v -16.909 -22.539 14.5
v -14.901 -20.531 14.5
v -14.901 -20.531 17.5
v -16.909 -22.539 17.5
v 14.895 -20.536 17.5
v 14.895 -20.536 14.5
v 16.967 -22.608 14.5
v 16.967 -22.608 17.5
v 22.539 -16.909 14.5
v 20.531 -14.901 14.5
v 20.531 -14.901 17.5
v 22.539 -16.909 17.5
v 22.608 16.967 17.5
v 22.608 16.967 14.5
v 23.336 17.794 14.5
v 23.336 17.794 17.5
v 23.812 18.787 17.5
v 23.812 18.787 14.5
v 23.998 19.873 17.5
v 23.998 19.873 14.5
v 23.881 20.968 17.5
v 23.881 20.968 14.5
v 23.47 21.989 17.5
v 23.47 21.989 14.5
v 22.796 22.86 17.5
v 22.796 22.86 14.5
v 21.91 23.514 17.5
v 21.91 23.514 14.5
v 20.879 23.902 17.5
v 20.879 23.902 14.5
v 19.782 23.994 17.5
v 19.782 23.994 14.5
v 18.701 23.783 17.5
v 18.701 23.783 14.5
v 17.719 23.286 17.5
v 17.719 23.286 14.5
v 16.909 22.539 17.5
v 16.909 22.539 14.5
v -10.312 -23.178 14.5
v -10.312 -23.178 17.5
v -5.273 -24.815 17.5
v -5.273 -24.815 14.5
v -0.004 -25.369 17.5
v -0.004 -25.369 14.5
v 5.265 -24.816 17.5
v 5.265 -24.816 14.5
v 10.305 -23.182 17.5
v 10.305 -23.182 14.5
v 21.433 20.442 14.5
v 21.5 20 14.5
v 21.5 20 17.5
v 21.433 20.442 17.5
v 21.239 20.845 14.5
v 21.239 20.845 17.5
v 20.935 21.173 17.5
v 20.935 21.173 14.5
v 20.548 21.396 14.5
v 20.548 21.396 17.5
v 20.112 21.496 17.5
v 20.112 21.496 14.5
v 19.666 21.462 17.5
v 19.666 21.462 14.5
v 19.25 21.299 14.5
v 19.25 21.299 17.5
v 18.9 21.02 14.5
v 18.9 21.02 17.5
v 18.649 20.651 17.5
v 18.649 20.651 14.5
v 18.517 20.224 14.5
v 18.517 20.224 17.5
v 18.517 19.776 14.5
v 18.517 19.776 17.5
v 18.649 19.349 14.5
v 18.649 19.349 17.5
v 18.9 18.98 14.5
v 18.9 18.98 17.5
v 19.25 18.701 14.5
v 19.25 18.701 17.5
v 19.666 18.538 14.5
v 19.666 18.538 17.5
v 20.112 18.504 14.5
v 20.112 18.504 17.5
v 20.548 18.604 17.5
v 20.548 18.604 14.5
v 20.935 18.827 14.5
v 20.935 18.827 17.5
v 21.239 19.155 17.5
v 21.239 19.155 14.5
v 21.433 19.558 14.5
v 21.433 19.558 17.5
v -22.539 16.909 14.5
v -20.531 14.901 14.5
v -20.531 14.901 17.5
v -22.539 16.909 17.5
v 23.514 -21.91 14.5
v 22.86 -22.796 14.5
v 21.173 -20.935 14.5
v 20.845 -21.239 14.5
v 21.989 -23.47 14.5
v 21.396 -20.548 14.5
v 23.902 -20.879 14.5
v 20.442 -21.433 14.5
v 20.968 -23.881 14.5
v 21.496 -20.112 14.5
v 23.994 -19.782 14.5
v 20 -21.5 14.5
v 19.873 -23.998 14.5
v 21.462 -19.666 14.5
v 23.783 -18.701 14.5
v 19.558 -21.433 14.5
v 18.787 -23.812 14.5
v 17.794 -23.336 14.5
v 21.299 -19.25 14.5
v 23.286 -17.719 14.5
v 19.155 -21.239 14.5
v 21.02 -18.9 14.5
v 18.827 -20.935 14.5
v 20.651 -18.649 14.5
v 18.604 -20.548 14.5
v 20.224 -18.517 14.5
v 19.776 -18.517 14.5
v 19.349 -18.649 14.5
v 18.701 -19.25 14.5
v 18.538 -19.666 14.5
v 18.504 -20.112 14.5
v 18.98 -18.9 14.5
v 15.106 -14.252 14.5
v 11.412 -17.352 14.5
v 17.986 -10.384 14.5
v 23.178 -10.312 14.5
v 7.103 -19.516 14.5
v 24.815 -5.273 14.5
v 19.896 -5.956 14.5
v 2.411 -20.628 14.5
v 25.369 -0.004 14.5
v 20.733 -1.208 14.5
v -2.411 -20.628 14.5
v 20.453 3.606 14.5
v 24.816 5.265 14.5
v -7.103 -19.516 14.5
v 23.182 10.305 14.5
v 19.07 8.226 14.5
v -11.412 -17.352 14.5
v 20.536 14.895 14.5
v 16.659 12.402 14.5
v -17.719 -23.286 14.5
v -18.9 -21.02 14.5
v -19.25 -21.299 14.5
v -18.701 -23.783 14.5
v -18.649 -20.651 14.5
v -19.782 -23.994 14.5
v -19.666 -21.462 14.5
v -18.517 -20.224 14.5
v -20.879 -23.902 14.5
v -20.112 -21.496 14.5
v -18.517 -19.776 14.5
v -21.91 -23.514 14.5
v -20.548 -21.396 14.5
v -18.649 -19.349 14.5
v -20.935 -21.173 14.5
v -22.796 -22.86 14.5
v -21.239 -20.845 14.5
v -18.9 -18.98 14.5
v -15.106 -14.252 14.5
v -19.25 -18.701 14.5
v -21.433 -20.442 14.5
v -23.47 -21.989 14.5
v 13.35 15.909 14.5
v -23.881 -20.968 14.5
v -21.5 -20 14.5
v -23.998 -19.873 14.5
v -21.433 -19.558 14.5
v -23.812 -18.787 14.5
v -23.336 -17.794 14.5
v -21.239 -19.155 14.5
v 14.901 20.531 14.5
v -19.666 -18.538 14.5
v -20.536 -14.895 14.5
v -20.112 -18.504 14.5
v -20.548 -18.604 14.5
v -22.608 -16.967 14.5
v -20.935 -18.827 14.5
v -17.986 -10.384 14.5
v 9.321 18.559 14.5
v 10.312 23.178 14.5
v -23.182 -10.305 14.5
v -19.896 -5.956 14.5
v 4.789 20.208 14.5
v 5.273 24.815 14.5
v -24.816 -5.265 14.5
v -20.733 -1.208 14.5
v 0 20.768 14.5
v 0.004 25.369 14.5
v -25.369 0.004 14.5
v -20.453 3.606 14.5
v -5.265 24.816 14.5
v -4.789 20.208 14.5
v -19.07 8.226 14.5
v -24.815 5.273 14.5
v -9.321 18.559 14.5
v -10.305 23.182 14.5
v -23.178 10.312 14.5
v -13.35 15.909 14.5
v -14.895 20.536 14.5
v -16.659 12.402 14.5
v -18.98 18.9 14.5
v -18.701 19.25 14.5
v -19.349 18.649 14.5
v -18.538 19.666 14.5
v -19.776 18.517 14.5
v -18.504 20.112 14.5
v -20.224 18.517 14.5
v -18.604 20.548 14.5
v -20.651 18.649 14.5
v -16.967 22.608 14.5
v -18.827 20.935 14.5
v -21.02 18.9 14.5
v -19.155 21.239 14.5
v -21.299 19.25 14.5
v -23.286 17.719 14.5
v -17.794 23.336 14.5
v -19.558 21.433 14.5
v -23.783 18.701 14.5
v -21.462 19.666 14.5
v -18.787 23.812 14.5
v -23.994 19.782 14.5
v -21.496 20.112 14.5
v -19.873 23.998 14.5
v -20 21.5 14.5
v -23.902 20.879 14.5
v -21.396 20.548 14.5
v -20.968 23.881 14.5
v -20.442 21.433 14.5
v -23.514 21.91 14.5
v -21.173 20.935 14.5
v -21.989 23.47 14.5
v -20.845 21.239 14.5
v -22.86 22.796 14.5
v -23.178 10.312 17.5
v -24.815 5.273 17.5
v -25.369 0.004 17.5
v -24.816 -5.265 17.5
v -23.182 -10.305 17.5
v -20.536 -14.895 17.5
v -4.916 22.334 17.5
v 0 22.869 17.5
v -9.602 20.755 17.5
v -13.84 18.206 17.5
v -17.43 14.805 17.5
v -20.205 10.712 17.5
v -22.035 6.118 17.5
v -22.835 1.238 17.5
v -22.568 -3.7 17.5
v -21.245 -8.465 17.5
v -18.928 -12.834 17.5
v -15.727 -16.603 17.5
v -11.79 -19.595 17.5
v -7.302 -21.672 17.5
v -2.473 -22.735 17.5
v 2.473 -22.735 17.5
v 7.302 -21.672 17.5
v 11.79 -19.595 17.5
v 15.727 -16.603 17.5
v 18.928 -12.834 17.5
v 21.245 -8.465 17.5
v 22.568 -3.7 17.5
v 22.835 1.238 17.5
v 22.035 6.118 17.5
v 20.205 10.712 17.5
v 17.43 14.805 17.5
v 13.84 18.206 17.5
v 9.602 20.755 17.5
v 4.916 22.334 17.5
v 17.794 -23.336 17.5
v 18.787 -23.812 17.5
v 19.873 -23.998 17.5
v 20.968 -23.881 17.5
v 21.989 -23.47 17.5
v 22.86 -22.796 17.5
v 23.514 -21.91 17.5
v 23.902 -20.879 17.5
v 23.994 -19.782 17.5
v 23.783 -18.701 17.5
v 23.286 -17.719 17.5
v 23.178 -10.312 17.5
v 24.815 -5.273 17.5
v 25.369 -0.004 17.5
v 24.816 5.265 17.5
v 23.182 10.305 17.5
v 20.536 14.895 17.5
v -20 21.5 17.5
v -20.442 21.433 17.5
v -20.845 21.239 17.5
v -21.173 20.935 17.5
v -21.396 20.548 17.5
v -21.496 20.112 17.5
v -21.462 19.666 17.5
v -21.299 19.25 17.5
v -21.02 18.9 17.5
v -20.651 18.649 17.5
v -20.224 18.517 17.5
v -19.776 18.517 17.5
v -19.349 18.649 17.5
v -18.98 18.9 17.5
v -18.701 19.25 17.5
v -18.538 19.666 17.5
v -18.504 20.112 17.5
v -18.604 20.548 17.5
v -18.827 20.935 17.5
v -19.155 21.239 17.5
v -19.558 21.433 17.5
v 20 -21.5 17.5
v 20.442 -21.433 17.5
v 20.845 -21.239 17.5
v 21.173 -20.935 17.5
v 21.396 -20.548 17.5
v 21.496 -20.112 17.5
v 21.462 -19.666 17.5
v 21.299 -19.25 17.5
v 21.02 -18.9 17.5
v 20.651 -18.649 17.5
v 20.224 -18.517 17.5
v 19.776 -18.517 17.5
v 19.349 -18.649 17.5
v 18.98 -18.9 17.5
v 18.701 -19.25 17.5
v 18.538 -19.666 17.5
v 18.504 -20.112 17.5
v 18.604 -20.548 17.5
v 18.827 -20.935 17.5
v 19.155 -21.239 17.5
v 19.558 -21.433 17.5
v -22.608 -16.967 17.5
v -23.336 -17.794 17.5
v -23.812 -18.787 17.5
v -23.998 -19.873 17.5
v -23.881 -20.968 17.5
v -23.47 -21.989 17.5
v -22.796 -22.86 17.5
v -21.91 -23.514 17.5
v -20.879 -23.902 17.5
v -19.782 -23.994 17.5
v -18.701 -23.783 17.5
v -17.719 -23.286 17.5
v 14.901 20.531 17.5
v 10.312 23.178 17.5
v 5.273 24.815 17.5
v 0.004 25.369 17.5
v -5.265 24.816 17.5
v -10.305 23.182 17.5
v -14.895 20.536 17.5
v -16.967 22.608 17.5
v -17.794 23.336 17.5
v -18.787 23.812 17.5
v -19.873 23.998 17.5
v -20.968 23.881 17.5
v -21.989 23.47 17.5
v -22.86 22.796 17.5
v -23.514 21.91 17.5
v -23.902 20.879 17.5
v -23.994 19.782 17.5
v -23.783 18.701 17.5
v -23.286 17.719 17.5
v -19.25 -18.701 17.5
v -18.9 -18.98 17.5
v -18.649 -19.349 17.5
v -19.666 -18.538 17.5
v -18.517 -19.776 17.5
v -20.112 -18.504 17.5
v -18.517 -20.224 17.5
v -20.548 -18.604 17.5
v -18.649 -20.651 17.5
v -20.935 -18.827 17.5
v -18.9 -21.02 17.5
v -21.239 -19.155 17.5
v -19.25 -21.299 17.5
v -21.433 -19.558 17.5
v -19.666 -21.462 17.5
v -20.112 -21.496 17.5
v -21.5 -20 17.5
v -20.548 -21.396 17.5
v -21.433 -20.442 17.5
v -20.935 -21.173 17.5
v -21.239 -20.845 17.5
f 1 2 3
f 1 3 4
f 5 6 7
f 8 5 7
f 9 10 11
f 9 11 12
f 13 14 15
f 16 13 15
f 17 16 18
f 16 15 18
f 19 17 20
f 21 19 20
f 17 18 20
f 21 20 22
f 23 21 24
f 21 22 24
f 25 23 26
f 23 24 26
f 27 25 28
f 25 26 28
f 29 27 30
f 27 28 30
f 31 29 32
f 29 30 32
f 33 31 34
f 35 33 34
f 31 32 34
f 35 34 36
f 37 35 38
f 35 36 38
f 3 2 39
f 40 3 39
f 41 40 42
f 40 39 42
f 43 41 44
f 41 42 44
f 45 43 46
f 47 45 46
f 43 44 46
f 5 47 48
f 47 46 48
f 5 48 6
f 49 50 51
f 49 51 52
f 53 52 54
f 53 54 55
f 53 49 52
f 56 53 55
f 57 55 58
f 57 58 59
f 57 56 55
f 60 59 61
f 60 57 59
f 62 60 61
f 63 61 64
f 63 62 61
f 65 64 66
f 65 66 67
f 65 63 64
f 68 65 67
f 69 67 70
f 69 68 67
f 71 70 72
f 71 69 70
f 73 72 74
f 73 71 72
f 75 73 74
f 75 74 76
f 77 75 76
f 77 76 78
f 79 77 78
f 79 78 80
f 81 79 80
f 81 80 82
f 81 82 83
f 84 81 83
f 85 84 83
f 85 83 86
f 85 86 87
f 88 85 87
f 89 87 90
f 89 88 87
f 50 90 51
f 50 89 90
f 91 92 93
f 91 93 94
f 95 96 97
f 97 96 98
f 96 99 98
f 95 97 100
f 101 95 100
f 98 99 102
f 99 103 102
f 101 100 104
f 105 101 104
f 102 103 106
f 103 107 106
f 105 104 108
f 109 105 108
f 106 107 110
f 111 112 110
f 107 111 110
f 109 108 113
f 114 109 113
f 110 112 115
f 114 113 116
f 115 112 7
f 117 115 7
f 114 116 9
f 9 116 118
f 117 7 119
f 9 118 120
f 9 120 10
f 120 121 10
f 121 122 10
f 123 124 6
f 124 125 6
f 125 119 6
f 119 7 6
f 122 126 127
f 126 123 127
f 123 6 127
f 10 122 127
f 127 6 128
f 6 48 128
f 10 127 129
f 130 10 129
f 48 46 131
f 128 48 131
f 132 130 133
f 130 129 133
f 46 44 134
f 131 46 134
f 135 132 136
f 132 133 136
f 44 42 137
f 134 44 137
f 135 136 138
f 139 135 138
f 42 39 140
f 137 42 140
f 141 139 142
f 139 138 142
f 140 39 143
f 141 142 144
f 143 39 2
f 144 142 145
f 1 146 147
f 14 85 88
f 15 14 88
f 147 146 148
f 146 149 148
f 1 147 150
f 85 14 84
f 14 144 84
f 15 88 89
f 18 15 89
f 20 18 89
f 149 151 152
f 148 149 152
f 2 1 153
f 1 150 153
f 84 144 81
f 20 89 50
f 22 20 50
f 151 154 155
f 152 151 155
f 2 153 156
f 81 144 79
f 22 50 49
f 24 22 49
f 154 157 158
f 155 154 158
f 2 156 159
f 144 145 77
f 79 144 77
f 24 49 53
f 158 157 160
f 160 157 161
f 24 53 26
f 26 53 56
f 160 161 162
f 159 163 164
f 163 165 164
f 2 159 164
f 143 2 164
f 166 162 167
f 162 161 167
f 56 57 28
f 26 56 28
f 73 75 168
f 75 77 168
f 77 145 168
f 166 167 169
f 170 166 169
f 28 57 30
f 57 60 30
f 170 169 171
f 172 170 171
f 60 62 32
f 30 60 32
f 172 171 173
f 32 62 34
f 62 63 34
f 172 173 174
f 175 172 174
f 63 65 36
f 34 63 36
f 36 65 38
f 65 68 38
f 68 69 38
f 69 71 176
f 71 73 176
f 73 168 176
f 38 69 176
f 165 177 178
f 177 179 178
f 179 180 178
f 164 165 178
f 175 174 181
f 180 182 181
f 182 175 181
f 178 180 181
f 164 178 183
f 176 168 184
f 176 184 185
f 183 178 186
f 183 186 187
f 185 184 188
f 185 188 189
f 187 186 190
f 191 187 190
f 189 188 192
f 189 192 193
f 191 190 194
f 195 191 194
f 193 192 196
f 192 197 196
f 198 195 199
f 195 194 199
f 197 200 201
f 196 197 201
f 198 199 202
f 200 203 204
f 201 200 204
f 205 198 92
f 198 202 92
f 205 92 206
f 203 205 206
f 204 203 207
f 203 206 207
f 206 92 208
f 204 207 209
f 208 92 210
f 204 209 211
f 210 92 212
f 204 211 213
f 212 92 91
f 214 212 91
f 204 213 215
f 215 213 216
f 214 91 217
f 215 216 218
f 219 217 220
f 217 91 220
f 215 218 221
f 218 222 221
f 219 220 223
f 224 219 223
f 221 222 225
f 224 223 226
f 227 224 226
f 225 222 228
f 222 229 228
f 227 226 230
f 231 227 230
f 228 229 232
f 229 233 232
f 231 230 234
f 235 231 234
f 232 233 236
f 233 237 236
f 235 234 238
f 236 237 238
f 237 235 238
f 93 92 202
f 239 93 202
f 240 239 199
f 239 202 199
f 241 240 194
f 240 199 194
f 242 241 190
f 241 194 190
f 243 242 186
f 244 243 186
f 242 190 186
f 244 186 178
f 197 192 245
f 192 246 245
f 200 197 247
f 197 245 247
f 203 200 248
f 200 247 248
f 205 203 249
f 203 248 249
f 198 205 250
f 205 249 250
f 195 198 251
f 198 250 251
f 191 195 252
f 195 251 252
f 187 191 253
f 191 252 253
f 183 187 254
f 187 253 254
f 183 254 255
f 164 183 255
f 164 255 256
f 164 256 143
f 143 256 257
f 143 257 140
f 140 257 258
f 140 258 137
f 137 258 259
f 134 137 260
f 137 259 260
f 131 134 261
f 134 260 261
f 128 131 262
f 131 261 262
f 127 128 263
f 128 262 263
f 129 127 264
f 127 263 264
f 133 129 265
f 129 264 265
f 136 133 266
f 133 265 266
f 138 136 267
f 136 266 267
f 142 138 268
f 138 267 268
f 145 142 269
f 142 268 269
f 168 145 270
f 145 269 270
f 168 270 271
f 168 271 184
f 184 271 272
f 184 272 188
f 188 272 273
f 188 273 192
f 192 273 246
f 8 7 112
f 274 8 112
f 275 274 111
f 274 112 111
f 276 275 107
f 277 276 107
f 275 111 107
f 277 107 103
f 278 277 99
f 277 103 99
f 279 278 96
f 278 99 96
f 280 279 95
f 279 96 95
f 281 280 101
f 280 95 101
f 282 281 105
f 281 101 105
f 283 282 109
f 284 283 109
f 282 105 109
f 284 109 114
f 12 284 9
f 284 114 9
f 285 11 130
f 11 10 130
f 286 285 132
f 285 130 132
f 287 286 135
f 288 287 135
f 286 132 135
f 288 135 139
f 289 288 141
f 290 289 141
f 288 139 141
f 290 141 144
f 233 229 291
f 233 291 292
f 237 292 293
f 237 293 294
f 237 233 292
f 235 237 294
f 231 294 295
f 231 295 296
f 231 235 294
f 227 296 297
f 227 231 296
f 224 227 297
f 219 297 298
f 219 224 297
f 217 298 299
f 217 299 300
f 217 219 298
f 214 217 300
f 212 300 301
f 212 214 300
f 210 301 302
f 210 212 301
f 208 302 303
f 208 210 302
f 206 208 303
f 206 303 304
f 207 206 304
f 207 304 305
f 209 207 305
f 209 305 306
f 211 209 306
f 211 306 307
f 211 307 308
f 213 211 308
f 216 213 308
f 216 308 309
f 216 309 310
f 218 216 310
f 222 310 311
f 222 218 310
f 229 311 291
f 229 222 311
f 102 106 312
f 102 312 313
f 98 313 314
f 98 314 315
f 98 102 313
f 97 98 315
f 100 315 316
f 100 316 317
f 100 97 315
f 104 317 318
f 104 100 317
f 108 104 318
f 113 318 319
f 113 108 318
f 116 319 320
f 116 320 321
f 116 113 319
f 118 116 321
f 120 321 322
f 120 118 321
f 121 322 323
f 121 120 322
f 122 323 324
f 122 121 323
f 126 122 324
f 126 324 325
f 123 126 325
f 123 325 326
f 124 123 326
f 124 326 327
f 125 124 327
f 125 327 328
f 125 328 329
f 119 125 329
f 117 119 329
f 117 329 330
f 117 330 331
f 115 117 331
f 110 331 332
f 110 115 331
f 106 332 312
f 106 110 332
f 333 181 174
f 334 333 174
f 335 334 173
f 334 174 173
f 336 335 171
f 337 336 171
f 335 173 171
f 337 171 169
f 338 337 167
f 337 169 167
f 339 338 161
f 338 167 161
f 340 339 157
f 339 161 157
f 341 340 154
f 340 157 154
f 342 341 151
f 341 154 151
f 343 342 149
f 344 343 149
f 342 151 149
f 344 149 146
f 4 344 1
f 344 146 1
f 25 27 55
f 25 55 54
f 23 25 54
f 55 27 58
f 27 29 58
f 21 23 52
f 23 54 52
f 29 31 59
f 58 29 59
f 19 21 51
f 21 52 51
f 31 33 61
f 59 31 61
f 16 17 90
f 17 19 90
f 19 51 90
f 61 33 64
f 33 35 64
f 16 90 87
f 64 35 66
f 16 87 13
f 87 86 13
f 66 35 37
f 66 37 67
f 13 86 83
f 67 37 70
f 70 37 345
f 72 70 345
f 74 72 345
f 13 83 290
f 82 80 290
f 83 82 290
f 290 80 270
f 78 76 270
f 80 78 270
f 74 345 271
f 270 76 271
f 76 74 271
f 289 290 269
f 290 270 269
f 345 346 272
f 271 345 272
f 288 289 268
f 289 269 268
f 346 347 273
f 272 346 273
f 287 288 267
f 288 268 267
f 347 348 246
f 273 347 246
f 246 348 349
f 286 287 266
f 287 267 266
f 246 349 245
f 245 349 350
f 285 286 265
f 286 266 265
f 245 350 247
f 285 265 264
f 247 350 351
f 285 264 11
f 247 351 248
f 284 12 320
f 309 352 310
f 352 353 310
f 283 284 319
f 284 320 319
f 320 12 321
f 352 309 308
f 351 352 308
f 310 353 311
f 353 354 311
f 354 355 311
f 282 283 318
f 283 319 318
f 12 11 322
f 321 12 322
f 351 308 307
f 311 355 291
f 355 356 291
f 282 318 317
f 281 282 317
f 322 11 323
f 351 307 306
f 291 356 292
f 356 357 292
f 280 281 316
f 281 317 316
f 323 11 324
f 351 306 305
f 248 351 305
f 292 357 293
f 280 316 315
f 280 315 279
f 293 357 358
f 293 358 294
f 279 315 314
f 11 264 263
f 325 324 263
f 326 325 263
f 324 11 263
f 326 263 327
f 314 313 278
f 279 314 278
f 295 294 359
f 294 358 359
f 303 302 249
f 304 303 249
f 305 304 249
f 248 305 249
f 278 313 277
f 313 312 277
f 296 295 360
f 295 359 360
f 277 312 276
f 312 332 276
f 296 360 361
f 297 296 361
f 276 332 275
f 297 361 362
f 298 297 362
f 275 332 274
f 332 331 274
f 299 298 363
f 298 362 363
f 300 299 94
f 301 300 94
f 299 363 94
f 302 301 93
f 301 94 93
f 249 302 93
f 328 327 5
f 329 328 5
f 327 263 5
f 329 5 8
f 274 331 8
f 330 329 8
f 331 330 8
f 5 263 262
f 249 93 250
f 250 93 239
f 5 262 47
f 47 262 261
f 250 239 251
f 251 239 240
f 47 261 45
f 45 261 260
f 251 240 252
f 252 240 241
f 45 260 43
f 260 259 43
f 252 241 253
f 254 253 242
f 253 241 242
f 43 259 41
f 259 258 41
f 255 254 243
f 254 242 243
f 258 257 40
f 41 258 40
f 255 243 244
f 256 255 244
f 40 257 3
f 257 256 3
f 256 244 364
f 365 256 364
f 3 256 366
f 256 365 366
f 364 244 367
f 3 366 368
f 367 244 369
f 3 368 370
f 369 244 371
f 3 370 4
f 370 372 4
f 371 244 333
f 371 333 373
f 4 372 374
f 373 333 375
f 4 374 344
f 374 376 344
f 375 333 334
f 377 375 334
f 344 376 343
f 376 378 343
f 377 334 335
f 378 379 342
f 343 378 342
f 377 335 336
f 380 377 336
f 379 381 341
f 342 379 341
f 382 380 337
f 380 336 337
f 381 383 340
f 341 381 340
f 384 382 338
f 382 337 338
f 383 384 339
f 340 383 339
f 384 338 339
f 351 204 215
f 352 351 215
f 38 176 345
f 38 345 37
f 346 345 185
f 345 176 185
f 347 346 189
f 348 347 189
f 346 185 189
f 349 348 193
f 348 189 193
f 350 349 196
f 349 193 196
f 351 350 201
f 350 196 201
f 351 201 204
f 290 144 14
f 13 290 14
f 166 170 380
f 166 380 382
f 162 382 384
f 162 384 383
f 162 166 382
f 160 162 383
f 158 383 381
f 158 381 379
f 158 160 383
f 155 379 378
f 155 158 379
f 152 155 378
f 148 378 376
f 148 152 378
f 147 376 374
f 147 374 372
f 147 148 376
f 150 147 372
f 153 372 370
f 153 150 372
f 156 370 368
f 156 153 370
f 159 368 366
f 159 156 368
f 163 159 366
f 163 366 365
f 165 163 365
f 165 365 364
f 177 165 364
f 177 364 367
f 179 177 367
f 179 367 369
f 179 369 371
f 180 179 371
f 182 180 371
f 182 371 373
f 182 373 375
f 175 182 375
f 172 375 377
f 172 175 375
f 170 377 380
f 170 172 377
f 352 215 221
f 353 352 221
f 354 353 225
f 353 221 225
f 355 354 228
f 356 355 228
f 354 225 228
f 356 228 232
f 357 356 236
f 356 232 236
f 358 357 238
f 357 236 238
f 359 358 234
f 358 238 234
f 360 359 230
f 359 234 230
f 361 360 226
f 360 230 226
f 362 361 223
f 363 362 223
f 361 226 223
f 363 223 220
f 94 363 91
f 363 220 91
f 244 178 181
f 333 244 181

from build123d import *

# Parameters (mm, degrees)
SKETCH005_R = 1.5
PAD_DEPTH   = 3
ARRAY_COUNT = 4


with BuildPart() as revolution001:
    # Sketch004 → Revolution001 (revolve)
    with BuildSketch(Plane(origin=(0, 0, 16), x_dir=(0, 1, 0), z_dir=(1, 0, 0))):
        Polygon((20.768198, -1.5), (22.86882, 1.5), (25.36882, 1.5), (25.36882, -1.5), align=None)
    revolve(axis=Axis((0, 0, 16), (0, 0, 1)))


with BuildPart() as fusion:
    # Sketch005 → Pad (new body)
    with BuildSketch(Plane.XY.offset(14.5)):
        with BuildLine():
            ThreePointArc((20.271681, 14.630753), (17.680475, 17.674864), (14.637187, 20.267036))
            Line((14.637187, 20.267036), (16.909034, 22.538883))
            ThreePointArc((22.608377, 16.967448), (22.796148, 22.860342), (16.909034, 22.538883))
            Line((20.271681, 14.630753), (22.608377, 16.967448))
        make_face()
        with Locations((20, 20)):
            Circle(SKETCH005_R, mode=Mode.SUBTRACT)
    extrude(amount=PAD_DEPTH)

    # Array: Fusion ×4 about axis
    array_axis = Axis((0, 0, 1), (0, 0, 1))


with BuildPart() as fusion_1:
    add(fusion.part)
    for i in range(1, ARRAY_COUNT):
        add(fusion.part.rotate(array_axis, i * 360 / ARRAY_COUNT))

    # Fusion: union Revolution001
    add(revolution001.part)


solid = fusion_1.part
